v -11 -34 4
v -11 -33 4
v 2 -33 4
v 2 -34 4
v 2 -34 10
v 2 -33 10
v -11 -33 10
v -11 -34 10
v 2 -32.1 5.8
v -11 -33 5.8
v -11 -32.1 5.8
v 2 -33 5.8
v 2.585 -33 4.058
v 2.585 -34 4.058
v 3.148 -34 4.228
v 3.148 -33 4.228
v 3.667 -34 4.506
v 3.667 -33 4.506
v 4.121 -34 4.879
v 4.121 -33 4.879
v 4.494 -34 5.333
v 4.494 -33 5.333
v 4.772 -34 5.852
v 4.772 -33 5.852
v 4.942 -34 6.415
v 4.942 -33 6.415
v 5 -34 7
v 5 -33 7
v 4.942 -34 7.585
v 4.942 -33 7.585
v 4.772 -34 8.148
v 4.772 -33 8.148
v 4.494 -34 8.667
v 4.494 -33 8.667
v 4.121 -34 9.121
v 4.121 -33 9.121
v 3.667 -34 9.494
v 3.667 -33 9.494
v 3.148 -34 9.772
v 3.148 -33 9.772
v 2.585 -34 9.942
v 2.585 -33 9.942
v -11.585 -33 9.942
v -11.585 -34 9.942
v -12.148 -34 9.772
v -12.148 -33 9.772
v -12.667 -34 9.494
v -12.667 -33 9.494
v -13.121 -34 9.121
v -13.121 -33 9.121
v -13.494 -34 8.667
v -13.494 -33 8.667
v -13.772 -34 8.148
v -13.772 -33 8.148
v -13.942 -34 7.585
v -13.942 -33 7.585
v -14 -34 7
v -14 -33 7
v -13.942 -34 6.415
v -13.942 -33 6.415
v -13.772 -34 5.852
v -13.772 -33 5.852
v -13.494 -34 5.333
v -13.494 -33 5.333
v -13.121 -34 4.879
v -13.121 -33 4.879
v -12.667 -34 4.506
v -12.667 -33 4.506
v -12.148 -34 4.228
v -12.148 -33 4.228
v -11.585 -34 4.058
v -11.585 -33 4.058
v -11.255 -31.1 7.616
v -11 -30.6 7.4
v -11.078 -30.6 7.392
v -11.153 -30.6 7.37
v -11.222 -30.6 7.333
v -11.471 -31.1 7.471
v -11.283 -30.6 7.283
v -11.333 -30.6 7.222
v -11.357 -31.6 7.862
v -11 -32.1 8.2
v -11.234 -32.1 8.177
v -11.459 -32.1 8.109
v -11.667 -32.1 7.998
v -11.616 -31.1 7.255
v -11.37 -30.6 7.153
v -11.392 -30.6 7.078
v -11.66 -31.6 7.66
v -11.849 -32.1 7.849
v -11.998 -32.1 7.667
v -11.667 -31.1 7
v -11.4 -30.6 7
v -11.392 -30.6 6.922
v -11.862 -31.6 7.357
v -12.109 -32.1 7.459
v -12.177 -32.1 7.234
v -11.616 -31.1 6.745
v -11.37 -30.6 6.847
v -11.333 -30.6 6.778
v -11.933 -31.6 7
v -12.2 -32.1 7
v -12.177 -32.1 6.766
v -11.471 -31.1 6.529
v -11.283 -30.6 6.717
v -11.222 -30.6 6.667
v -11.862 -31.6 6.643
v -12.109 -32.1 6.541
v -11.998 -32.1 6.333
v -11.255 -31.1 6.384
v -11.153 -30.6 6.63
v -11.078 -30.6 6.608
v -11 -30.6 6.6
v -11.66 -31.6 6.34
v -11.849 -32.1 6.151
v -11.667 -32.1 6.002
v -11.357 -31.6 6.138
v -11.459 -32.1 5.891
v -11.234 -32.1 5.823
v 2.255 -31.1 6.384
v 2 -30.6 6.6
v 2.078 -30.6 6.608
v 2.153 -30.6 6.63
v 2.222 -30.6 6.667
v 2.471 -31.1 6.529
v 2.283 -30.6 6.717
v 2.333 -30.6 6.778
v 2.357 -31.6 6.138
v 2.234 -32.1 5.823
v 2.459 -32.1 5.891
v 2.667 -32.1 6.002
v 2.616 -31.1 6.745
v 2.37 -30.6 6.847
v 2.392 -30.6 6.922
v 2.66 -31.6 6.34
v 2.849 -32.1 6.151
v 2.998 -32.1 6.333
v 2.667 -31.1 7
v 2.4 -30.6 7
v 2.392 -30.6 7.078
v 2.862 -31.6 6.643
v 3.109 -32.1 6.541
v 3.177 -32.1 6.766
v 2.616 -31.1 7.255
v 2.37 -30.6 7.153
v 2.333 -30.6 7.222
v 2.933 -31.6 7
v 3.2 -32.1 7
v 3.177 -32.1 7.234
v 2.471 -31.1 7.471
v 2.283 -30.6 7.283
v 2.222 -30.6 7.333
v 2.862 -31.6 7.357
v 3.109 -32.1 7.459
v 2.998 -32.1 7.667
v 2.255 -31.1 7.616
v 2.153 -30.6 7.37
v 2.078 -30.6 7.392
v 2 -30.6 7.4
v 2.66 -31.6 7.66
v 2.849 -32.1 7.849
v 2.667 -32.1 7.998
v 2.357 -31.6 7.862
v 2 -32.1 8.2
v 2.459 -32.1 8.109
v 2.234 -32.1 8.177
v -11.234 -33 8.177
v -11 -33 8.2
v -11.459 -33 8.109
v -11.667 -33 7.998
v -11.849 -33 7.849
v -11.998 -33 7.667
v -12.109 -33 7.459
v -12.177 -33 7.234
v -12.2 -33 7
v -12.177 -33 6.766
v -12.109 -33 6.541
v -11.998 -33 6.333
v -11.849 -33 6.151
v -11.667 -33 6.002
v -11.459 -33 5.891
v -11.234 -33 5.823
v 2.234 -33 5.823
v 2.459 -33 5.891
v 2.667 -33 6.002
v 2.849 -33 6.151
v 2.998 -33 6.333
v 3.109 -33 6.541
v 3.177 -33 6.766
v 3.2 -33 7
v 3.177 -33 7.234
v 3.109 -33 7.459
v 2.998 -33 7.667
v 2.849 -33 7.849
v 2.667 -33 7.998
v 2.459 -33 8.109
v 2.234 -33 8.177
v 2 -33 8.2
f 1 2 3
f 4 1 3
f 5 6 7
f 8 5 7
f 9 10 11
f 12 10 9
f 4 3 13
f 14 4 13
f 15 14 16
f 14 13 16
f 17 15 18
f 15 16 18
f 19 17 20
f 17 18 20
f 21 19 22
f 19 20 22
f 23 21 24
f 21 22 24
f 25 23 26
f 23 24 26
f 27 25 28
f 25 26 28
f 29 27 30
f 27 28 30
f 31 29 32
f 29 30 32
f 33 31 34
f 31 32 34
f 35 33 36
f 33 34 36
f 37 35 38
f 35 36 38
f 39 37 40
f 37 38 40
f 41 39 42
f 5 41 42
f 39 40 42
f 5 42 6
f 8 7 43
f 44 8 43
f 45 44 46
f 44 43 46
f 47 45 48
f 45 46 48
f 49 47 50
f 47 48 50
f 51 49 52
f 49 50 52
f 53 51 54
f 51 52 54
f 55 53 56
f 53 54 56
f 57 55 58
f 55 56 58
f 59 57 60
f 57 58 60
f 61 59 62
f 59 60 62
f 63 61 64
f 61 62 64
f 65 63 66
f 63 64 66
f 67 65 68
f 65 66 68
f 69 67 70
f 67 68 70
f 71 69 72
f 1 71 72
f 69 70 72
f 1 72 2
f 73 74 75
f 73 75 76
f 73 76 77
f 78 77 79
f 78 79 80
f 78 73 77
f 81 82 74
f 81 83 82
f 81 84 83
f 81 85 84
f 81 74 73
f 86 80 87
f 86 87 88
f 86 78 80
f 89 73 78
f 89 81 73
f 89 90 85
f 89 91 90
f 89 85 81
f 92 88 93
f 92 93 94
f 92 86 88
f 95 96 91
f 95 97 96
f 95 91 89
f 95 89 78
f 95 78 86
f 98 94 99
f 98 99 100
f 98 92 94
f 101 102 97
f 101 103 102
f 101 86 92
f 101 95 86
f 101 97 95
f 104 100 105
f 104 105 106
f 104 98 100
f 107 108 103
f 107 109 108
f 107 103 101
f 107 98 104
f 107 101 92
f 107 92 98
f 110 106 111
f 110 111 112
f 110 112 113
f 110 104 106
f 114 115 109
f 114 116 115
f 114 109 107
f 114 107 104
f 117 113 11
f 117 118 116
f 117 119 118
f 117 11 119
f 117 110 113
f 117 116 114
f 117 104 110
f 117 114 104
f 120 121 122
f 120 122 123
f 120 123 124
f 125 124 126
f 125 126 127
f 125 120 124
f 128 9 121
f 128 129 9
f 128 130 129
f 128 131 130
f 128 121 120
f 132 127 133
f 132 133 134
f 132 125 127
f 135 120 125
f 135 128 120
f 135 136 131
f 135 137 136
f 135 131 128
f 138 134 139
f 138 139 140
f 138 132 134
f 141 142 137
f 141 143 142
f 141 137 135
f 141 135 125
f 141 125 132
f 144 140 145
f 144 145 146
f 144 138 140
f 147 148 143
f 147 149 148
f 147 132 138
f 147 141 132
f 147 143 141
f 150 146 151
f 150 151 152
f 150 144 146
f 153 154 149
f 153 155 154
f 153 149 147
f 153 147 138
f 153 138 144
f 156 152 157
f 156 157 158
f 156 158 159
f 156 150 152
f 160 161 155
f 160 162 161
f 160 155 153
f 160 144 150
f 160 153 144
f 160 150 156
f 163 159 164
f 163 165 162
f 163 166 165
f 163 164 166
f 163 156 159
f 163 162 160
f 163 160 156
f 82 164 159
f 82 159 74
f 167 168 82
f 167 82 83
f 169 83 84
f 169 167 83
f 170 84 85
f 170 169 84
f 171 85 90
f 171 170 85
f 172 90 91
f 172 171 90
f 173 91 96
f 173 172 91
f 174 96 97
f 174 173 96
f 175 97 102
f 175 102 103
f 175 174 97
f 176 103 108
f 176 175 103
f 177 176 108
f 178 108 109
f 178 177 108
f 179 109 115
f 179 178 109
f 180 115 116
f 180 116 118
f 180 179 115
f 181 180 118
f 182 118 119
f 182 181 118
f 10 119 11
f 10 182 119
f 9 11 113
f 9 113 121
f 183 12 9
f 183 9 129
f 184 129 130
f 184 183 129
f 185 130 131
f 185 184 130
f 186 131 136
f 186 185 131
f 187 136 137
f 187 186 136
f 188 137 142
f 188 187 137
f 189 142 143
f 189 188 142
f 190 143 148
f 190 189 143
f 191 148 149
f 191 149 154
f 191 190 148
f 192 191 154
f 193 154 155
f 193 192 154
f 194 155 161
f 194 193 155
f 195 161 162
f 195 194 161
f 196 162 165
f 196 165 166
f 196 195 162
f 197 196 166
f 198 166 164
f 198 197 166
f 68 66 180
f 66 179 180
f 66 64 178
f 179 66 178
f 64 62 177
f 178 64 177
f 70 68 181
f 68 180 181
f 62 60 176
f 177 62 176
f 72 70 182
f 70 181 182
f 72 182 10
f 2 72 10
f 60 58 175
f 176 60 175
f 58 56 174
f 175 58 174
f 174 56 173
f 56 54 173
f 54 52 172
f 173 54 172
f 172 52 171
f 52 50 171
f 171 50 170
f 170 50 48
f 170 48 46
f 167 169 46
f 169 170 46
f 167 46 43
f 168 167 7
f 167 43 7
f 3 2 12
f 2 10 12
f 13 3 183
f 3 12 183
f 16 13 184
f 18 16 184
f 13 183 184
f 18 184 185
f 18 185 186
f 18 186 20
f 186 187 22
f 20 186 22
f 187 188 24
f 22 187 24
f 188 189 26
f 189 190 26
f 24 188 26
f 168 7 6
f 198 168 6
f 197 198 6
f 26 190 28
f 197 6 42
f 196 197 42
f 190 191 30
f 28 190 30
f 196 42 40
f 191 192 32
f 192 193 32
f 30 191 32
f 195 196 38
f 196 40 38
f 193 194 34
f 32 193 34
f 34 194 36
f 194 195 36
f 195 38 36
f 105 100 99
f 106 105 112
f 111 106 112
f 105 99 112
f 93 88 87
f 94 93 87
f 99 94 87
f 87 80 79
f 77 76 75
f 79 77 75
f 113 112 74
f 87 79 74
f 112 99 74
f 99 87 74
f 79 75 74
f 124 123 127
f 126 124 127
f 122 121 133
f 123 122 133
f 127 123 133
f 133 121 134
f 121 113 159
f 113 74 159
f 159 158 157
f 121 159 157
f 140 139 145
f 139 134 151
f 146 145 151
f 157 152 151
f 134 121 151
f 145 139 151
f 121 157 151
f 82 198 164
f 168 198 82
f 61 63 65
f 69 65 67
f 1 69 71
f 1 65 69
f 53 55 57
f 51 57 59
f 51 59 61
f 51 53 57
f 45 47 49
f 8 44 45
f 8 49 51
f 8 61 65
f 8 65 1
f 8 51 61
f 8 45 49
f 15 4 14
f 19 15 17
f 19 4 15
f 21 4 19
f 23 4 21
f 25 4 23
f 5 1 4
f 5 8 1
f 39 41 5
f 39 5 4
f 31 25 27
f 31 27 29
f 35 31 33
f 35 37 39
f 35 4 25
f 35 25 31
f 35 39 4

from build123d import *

# Parameters (mm, degrees)
EXTRUDE010_DEPTH = 1
EXTRUDE009_DEPTH = 2.4
CHAMFER005_SIZE2 = 1.5
CHAMFER005_SIZE  = 0.8


with BuildPart() as extrude010:
    # Sketch011 (on Sketch) → Extrude010 (new body)
    with BuildSketch(Plane.XZ.offset(33)):
        with BuildLine():
            ThreePointArc((-11, 10), (-14, 7), (-11, 4))
            Line((-11, 4), (2, 4))
            ThreePointArc((2, 4), (5, 7), (2, 10))
            Line((2, 10), (-11, 10))
        make_face()
    extrude(amount=EXTRUDE010_DEPTH)


with BuildPart() as deckel_microsd001:
    # Sketch010 (on Sketch) → Extrude009 (new body)
    with BuildSketch(Plane.XZ.offset(33)):
        with BuildLine():
            ThreePointArc((-11, 8.2), (-12.2, 7), (-11, 5.8))
            Line((-11, 5.8), (2, 5.8))
            ThreePointArc((2, 5.8), (3.2, 7), (2, 8.2))
            Line((2, 8.2), (-11, 8.2))
        make_face()
    extrude(amount=-EXTRUDE009_DEPTH)

    # Connect002: union Extrude010
    add(extrude010.part)

    # Chamfer005
    chamfer005_edges = [deckel_microsd001.edges().sort_by_distance(p)[0] for p in [
        (-4.5, -30.6, 8.2),
    ]]
    chamfer005_side = deckel_microsd001.faces().sort_by_distance((-4.5, -30.6, 7))[0]
    chamfer(chamfer005_edges, length=CHAMFER005_SIZE, length2=CHAMFER005_SIZE2, reference=chamfer005_side)


solid = deckel_microsd001.part
